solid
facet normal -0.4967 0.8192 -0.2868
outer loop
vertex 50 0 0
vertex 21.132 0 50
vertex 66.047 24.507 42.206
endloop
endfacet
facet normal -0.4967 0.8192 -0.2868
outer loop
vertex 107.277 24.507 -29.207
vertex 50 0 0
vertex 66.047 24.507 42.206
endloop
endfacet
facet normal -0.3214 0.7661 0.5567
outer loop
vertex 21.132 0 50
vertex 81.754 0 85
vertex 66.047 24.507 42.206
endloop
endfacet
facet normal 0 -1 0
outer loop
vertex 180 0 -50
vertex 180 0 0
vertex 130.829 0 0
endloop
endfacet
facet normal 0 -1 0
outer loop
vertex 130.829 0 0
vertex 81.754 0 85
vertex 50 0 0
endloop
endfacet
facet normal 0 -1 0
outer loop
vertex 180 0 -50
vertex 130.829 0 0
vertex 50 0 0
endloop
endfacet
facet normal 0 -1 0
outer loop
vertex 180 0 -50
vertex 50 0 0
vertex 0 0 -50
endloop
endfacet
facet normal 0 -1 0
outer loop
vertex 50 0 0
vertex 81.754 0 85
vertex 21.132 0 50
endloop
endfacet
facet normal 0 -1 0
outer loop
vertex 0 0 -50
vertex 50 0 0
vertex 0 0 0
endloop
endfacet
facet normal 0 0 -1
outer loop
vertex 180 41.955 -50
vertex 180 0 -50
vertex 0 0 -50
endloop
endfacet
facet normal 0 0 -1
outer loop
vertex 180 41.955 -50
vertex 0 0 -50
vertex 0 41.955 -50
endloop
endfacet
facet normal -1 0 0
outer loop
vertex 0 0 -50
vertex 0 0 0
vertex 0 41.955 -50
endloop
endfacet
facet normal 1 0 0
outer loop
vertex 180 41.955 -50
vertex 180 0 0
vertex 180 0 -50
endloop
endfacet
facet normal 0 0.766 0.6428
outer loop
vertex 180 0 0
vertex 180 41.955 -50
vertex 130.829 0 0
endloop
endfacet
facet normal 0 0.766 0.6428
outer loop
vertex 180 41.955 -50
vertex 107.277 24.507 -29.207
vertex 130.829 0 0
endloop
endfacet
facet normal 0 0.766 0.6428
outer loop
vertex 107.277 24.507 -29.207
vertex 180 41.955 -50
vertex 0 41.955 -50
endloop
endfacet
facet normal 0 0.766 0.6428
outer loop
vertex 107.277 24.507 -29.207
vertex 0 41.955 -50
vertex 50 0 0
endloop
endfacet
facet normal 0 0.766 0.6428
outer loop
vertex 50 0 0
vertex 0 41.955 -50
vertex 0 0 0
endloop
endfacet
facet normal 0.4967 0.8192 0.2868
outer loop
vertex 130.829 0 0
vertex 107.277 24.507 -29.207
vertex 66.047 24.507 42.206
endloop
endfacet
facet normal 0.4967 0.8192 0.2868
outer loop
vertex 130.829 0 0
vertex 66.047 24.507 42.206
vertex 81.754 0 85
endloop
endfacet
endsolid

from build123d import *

# Parameters (mm, degrees)
EXTRUDE1_DEPTH     = 180
EXTRUDE2_DEPTH     = 115
CUT_EXTRUDE1_DEPTH = 35


with BuildPart() as part:
    # Sketch1 → Extrude1 (new body)
    with BuildSketch(Plane(origin=(0, 0, 0), x_dir=(0, 0, -1), z_dir=(1, 0, 0))):
        Polygon((0, 0), (50, 0), (50, 41.954981559), align=None)
    extrude(amount=EXTRUDE1_DEPTH)

    # Sketch5 → Extrude2 (add)
    with BuildSketch(Plane(origin=(-16.367513459, 0, 28.349364905), x_dir=(0.866025404, 0, 0.5), z_dir=(-0.5, 0, 0.866025404))):
        Polygon((43.301270189, 0), (78.301270189, 24.507263837), (113.301270189, 0), align=None)
    extrude(amount=-EXTRUDE2_DEPTH)

    # Sketch6 → Cut-Extrude1 (cut, symmetric)
    with BuildSketch(Plane(origin=(51.443375673, 0, 67.5), x_dir=(0.5, 0, -0.866025404), z_dir=(0.866025404, 0, 0.5))):
        Polygon((29.206619723, 24.507263837), (0, 24.507263837), (0, 0), align=None)
    extrude(amount=CUT_EXTRUDE1_DEPTH, both=True, mode=Mode.SUBTRACT)


solid = part.part
